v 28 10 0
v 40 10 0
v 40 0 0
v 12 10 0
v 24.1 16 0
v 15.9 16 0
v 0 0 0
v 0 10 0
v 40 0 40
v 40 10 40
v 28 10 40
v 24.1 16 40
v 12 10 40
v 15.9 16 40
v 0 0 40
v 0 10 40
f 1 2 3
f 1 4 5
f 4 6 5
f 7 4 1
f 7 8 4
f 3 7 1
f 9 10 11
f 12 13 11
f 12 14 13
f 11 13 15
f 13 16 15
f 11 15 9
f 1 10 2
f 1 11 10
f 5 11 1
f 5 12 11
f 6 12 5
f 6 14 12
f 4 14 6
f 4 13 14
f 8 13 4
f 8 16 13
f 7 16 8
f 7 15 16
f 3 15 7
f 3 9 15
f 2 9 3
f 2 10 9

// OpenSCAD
$fn = 32;

// ----------------------------------------------------------------------
// V guide rail: dovetail, 40 mm wide
// ----------------------------------------------------------------------

// --- parameters (mm) ---
rail_w = 40;              // rail width, X
base_t = 10;              // base plate thickness
v_depth = 6;              // V feature depth / height
v_half_w = 8;             // half width of the V at the base face
plate_t = 40;             // rail length, Z (the extrusion height)
top_half_w = 4.1;         // half width at the dovetail top

dovetail_base = 2 * v_half_w;  // dovetail width at the base
dovetail_top = 2 * top_half_w;  // dovetail width at the top

profile = [[0, 0], [40, 0], [40, 10], [28, 10], [24.1, 16], [15.9, 16], [12, 10], [0, 10]];  // primary outline, 8 points, counter clockwise

// --- the one profile operation ---
linear_extrude(height = plate_t) polygon(points = profile);
